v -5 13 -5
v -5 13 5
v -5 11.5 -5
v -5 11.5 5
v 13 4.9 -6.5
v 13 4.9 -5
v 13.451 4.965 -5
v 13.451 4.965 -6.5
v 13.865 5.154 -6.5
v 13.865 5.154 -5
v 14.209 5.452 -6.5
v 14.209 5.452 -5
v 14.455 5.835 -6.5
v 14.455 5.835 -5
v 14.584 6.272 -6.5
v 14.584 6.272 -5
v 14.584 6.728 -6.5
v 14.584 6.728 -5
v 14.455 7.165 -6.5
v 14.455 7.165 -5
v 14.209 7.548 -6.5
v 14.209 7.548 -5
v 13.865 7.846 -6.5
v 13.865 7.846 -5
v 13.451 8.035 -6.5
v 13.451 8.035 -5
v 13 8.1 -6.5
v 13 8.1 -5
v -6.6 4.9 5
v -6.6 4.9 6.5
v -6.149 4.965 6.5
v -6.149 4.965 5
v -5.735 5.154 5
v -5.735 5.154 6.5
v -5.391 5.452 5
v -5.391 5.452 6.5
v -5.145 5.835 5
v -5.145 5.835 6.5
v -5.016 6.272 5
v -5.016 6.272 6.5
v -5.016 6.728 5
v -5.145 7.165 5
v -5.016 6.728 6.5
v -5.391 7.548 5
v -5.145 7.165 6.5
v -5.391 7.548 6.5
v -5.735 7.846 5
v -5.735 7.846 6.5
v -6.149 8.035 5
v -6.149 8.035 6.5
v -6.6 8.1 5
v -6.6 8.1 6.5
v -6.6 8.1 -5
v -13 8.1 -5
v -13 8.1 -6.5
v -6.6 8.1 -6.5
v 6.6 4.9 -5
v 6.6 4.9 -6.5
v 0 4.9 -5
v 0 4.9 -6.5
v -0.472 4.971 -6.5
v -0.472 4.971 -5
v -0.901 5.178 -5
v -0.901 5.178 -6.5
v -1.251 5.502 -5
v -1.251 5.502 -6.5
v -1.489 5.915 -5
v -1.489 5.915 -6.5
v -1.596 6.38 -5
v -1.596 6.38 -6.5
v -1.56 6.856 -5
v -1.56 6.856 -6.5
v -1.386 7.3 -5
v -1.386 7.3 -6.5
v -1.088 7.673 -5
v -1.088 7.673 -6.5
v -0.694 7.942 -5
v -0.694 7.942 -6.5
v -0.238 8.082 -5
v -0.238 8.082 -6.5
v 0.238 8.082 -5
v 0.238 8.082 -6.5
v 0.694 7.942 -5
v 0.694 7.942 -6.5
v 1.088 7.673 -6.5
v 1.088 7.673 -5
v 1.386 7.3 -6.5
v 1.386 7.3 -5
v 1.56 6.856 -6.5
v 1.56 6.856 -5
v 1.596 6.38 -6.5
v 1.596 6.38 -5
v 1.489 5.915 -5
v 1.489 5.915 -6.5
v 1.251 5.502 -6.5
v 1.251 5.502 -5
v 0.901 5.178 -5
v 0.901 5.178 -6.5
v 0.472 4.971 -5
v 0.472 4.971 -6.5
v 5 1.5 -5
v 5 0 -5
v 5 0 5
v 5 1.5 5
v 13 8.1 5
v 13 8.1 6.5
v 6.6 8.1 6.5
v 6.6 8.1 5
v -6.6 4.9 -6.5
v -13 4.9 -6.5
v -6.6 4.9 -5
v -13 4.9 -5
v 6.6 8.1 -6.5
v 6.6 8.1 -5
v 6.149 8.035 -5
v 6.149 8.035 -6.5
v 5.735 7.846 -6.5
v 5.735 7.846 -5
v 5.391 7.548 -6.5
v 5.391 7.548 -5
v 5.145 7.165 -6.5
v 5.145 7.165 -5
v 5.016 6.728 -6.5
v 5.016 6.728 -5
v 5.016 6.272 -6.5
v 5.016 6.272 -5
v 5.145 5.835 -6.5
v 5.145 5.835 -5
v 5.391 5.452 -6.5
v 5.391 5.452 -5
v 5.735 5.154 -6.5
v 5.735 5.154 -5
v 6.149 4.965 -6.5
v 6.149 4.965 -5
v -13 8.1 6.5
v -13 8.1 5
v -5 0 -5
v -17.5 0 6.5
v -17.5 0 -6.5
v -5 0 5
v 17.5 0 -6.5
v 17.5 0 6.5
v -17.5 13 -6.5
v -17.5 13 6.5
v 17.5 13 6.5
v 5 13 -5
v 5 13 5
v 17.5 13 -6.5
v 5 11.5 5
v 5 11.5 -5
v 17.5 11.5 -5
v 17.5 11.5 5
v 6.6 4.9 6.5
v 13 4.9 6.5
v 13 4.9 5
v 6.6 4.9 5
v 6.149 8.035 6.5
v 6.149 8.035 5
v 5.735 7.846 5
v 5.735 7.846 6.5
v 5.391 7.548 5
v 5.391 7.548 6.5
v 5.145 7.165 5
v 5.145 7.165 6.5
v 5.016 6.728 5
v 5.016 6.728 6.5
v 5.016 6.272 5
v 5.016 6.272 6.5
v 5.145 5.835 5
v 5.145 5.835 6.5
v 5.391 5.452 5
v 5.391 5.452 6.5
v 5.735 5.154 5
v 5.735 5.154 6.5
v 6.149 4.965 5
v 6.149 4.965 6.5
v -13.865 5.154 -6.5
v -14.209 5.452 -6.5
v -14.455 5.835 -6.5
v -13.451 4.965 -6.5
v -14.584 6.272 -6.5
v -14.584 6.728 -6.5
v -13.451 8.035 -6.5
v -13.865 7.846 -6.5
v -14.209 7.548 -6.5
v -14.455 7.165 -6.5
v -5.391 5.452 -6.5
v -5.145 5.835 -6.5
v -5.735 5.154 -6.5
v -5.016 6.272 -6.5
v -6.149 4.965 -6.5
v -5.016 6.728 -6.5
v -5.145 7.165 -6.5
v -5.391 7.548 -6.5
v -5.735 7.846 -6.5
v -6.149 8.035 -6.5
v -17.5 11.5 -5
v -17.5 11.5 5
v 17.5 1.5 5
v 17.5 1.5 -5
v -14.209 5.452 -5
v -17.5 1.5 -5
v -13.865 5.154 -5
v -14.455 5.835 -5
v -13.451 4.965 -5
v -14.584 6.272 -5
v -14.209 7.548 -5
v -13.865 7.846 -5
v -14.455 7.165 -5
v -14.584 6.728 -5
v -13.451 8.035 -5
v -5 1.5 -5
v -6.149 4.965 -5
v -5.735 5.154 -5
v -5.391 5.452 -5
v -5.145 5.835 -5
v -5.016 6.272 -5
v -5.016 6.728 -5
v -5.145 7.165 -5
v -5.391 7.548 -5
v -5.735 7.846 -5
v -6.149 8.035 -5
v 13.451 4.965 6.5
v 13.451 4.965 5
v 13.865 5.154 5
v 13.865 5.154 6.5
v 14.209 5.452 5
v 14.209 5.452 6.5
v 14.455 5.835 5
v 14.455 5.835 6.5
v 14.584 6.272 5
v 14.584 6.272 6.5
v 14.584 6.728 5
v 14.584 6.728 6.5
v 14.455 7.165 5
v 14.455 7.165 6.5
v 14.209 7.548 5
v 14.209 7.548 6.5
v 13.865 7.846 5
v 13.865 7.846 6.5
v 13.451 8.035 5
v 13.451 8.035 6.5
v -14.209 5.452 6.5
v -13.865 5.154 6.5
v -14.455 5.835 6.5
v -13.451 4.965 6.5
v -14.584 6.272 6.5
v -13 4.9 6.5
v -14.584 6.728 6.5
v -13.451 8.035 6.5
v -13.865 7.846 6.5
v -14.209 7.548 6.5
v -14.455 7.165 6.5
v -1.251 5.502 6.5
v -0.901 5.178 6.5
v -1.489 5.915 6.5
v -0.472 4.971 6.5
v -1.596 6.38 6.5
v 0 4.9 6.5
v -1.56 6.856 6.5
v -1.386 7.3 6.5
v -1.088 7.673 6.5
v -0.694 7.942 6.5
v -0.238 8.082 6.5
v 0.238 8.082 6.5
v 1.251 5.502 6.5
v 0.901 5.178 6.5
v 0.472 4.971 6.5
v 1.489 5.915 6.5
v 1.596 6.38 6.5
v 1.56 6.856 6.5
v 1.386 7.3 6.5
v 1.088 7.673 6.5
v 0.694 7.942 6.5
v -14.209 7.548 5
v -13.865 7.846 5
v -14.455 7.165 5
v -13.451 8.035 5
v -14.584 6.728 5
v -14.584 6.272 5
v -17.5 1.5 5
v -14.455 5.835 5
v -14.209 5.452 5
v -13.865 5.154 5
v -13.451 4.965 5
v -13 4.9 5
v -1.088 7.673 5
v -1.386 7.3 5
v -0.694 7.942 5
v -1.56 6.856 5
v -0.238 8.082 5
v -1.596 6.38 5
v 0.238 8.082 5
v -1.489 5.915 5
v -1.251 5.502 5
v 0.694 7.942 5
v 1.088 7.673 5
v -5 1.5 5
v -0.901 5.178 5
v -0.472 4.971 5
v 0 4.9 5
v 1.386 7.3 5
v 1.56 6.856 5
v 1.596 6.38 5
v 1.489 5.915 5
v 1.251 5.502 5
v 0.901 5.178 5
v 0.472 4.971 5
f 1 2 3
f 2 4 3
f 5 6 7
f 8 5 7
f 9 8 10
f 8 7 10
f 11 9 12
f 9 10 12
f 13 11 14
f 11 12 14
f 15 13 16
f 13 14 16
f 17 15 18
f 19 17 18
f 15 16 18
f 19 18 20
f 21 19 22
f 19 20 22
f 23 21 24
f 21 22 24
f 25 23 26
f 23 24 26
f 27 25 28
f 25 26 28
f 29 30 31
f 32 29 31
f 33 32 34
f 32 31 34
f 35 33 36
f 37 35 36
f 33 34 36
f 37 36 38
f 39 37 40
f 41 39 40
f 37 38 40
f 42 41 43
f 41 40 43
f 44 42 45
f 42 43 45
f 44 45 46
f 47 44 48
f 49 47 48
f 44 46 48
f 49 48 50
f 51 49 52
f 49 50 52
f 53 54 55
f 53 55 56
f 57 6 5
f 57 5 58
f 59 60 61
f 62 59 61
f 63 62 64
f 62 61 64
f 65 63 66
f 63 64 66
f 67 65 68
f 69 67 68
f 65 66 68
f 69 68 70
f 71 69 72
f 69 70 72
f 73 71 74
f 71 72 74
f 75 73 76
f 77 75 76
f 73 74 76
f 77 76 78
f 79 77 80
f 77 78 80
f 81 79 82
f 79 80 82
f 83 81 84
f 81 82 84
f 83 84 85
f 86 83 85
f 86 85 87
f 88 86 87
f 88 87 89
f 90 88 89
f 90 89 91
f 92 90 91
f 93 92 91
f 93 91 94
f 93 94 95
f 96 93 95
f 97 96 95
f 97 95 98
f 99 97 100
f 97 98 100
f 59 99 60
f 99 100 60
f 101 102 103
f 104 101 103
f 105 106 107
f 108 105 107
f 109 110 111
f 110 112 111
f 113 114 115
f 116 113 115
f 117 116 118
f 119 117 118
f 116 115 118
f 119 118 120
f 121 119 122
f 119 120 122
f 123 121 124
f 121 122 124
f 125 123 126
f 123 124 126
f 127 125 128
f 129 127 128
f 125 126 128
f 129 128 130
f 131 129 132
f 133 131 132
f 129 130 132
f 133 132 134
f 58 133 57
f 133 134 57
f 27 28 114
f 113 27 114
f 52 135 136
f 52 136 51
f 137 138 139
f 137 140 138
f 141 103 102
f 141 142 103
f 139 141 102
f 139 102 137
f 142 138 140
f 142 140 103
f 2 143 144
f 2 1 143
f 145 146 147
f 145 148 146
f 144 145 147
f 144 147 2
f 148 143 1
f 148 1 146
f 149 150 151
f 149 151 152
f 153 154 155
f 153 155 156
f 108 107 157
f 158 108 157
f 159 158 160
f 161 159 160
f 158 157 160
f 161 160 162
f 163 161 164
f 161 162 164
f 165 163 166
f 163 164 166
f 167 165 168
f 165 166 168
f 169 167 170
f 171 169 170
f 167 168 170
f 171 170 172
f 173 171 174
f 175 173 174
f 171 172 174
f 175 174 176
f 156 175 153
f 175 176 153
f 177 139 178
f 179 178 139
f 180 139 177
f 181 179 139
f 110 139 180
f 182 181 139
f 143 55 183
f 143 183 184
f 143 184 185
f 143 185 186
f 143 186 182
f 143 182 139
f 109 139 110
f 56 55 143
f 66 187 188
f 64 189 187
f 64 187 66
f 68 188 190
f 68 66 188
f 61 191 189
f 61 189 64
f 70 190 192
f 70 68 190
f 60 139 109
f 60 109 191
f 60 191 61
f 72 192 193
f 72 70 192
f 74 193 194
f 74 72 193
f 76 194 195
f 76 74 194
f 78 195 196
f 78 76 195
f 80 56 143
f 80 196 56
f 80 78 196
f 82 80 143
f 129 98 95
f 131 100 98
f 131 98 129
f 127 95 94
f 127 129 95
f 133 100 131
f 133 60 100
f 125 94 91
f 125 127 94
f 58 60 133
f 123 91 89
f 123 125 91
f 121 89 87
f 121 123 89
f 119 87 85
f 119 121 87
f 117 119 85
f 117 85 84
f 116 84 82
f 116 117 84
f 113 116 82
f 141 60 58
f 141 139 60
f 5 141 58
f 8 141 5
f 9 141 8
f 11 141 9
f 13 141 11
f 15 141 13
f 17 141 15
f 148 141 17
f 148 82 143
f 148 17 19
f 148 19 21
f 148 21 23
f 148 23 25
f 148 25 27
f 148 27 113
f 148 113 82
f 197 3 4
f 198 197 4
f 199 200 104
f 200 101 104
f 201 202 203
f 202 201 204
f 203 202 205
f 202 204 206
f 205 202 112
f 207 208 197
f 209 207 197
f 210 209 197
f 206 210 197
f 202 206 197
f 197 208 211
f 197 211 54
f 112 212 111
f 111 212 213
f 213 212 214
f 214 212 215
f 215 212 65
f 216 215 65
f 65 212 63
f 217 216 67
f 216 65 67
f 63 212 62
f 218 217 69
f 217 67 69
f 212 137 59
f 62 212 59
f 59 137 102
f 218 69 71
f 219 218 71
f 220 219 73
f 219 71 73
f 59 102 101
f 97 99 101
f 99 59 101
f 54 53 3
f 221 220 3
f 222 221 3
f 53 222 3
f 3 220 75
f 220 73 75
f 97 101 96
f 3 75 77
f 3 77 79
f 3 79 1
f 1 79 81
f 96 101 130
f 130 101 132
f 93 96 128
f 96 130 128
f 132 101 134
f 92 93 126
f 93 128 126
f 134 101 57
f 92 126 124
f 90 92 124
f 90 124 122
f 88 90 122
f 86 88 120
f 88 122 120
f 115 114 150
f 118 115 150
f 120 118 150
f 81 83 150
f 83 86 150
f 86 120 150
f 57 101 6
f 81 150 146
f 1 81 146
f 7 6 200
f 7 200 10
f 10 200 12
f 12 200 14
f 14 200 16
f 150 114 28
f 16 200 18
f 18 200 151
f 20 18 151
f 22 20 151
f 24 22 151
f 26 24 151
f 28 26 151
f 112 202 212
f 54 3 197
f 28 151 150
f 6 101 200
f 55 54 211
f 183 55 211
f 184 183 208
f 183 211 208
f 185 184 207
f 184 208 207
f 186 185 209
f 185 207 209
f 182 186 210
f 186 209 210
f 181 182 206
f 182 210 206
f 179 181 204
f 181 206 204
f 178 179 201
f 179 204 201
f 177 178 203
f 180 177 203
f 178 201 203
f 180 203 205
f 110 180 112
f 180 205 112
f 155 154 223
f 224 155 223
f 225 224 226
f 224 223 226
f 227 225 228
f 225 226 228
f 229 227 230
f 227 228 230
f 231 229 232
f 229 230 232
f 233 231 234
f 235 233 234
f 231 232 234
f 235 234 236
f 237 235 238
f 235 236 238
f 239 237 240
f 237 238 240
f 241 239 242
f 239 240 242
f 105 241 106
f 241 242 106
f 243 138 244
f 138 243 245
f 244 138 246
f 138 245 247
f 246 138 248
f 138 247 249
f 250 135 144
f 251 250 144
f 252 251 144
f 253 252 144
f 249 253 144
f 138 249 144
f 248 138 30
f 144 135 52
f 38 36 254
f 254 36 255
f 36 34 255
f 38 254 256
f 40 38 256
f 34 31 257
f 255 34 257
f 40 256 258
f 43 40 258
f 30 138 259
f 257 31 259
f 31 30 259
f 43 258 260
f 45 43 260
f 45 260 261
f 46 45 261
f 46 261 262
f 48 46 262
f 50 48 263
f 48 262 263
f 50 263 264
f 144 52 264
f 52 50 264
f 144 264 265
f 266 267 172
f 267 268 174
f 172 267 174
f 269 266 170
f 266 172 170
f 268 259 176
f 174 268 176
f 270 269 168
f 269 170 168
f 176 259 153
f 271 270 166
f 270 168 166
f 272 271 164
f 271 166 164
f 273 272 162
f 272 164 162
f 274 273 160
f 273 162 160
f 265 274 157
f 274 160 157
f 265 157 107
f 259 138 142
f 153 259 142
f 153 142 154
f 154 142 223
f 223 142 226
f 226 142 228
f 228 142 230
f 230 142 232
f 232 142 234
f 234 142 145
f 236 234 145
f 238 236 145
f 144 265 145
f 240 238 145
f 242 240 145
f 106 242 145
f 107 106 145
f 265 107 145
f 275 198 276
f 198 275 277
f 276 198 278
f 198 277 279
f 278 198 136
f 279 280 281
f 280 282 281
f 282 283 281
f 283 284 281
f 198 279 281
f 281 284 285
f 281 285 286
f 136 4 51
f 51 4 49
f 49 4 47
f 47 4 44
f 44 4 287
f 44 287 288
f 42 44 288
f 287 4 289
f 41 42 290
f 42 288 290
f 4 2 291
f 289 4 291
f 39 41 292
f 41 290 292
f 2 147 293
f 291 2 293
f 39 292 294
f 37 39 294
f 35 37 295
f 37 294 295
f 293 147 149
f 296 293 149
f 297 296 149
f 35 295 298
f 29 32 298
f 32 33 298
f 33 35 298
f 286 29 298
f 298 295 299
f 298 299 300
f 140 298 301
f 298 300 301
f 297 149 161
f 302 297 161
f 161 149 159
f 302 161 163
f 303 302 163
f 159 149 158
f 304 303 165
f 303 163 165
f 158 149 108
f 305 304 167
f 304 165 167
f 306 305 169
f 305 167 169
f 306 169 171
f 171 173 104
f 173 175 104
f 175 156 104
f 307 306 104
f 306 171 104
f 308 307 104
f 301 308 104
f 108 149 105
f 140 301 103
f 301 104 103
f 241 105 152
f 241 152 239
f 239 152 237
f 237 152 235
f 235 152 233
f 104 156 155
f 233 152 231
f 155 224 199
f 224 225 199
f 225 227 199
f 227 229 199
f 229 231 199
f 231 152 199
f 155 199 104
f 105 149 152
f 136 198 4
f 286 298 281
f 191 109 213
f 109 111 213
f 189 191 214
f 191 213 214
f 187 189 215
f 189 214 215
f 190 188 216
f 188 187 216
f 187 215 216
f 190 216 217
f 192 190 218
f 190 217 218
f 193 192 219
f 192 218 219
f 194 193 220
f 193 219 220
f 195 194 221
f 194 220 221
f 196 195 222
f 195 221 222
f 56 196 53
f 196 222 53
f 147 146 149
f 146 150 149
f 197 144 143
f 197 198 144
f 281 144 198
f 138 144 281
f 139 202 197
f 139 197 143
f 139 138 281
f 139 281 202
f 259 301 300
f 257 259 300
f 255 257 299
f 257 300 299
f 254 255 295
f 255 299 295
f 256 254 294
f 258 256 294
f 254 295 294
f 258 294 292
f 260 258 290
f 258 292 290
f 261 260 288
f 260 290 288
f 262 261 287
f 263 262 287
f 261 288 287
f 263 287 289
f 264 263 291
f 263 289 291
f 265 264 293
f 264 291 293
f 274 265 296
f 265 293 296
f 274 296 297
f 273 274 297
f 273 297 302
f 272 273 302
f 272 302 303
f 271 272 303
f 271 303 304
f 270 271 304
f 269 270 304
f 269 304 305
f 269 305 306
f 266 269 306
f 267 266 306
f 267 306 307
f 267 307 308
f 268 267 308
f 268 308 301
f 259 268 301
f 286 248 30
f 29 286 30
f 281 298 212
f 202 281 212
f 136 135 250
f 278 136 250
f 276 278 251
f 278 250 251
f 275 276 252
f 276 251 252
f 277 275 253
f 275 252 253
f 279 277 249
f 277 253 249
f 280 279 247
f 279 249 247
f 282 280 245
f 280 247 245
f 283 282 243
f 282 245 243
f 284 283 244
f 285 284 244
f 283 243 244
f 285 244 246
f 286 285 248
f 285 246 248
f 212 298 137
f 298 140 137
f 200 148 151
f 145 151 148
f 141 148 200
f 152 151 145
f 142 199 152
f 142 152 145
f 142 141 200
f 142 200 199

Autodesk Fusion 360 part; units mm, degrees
sketch "スケッチ1" plane through (0, 0, 0) normal (0, 1, 0) x (1, 0, 0)
  line L0 (0, 8) -> (0, -10)
  line L1 (-10, 0) -> (10, 0)
  line L2 (-6.5, 6.5) -> (6.5, 6.5)
  line L3 (6.5, 6.5) -> (6.5, -6.5)
  line L4 (6.5, -6.5) -> (-6.5, -6.5)
  line L5 (-6.5, -6.5) -> (-6.5, 6.5)
  line L6 (-5, 5) -> (5, 5)
  line L7 (5, 5) -> (5, -5)
  line L8 (5, -5) -> (-5, -5)
  line L9 (-5, -5) -> (-5, 5)
  dimension "d1" = 13
  dimension "d2" = 13
extrude "押し出し1" add sketch "スケッチ1" along normal blind 13 contours L0 L1 L2 L3 L6 L7 | L0 L1 L2 L5 L6 L9 | L0 L1 L4 L5 L8 L9 | L0 L1 L3 L4 L7 L8
sketch "スケッチ2" plane through (0, 0, 6.5) normal (0, 0, 1) x (1, 0, 0)
  line L0 (-6.5, 0) -> (6.5, 0)
  line L1 (6.5, 0) -> (6.5, 13)
  line L2 (6.5, 13) -> (-6.5, 13)
  line L3 (-6.5, 13) -> (-6.5, 0)
  point P0 (0, 6.5)
  dimension "d5" = 6.5
  dimension "d6" = 6.5
hole "穴1" at (0, 6.5, 6.5) direction (0, 0, -1) diameter 3.2 depth 20 tip angle 118
sketch "スケッチ3" plane through (6.5, 0, 0) normal (1, 0, 0) x (0, 0, -1)
  line L0 (-6.5, 0) -> (6.5, 0)
  line L1 (6.5, 0) -> (6.5, 13)
  line L2 (6.5, 13) -> (-6.5, 13)
  line L3 (-6.5, 13) -> (-6.5, 0)
  line L4 (-9, 6.5) -> (10, 6.5)
  line L5 (0, 14) -> (0, -2)
  line L6 (-5, 11.5) -> (5, 11.5)
  line L7 (5, 11.5) -> (5, 1.5)
  line L8 (5, 1.5) -> (-5, 1.5)
  line L9 (-5, 1.5) -> (-5, 11.5)
  dimension "d10" = 10
  dimension "d11" = 10
extrude "押し出し2" cut sketch "スケッチ3" against normal blind 17 contours L4 L5 L8 L9 | L4 L5 L7 L8 | L4 L5 L6 L9 | L4 L5 L6 L7
extrude "押し出し3" add 1 faces at (6.5, 4.8333, -6) along direction (1, 0, 0) blind 13
extrude "押し出し4" add 1 faces at (-6.5, 4.8333, 6) along direction (-1, 0, 0) blind 13
sketch "スケッチ4" plane through (0, 13, 0) normal (0, 1, 0) x (-1, 0, 0)
  line L0 (-5, 5) -> (5, 5)
  line L1 (5, 5) -> (5, -5)
  line L2 (5, -5) -> (-5, -5)
  line L3 (-5, -5) -> (-5, 5)
  line L4 (19.5, 6.5) -> (-19.5, 6.5)
  line L5 (-19.5, 6.5) -> (-19.5, -6.5)
  line L6 (-19.5, -6.5) -> (19.5, -6.5)
  line L7 (19.5, -6.5) -> (19.5, 6.5)
sketch "スケッチ5" plane through (0, 0, -6.5) normal (0, 0, -1) x (-1, 0, 0)
  circle A0 centre (0, 6.5) radius 1.6
  line L0 (-19.5, 0) -> (19.5, 0)
  line L1 (19.5, 0) -> (19.5, 13)
  line L2 (19.5, 13) -> (-19.5, 13)
  line L3 (-19.5, 13) -> (-19.5, 0)
  line L4 (-19.5, 13) -> (19.5, 13)
  point P0 (-13, 6.5)
  point P1 (13, 6.5)
  dimension "d18" = 6.5
  dimension "d19" = 6.5
  dimension "d20" = 6.5
  dimension "d21" = 6.5
hole "穴2" at (13, 6.5, -6.5) at (-13, 6.5, -6.5) direction (0, 0, 1) diameter 3.2 depth 100 tip angle 118
extrude "押し出し5" cut 1 faces at (19.5, 4.8333, -6) along direction (-1, 0, 0) blind 2
extrude "押し出し6" cut 1 faces at (-19.5, 4.8333, 6) along direction (1, 0, 0) blind 2
sketch "スケッチ6" plane through (0, 0, 6.5) normal (0, 0, 1) x (1, 0, 0)
  line L0 (-17.5, 13) -> (-17.5, 0)
  line L1 (-17.5, 0) -> (17.5, 0)
  line L2 (17.5, 0) -> (17.5, 13)
  line L3 (17.5, 13) -> (-17.5, 13)
  circle A0 centre (0, 6.5) radius 1.6
  circle A1 centre (-13, 6.5) radius 1.6
  circle A2 centre (13, 6.5) radius 1.6
  line L4 (-13, 6.5) -> (-9.8, 6.5)
  circle A3 centre (-9.8, 6.5) radius 1.6
  line L5 (13, 6.5) -> (9.8, 6.5)
  circle A4 centre (9.8, 6.5) radius 1.6
  line L6 (-9.8, 6.5) -> (-6.6, 6.5)
  line L7 (9.8, 6.5) -> (6.6, 6.5)
  circle A5 centre (-6.6, 6.5) radius 1.6
  circle A6 centre (6.6, 6.5) radius 1.6
  line L8 (-13, 6.5) -> (-13, 8.1)
  line L9 (-13, 6.5) -> (-13, 4.9)
  line L10 (-13, 8.1) -> (-6.6, 8.1)
  line L11 (-13, 4.9) -> (-6.6, 4.9)
  line L12 (13, 6.5) -> (13, 8.1)
  line L13 (13, 6.5) -> (13, 4.9)
  line L14 (13, 8.1) -> (6.6, 8.1)
  line L15 (13, 4.9) -> (6.6, 4.9)
  dimension "d29" = 3.2
  dimension "d30" = 3.2
  dimension "d31" = 3.2
  dimension "d32" = 3.2
extrude "押し出し7" cut sketch "スケッチ6" against normal blind 13 contours A1 A3 L11 | L4 A3 L6 | A1 A3 L10 | L4 A3 L6 | A3 A5 L10 | A3 A5 L11 | A5 | A2 A4 L14 | A2 A4 L15 | L5 A4 L7 | L5 A4 L7 | A4 A6 L14 | A4 A6 L15 | A6
